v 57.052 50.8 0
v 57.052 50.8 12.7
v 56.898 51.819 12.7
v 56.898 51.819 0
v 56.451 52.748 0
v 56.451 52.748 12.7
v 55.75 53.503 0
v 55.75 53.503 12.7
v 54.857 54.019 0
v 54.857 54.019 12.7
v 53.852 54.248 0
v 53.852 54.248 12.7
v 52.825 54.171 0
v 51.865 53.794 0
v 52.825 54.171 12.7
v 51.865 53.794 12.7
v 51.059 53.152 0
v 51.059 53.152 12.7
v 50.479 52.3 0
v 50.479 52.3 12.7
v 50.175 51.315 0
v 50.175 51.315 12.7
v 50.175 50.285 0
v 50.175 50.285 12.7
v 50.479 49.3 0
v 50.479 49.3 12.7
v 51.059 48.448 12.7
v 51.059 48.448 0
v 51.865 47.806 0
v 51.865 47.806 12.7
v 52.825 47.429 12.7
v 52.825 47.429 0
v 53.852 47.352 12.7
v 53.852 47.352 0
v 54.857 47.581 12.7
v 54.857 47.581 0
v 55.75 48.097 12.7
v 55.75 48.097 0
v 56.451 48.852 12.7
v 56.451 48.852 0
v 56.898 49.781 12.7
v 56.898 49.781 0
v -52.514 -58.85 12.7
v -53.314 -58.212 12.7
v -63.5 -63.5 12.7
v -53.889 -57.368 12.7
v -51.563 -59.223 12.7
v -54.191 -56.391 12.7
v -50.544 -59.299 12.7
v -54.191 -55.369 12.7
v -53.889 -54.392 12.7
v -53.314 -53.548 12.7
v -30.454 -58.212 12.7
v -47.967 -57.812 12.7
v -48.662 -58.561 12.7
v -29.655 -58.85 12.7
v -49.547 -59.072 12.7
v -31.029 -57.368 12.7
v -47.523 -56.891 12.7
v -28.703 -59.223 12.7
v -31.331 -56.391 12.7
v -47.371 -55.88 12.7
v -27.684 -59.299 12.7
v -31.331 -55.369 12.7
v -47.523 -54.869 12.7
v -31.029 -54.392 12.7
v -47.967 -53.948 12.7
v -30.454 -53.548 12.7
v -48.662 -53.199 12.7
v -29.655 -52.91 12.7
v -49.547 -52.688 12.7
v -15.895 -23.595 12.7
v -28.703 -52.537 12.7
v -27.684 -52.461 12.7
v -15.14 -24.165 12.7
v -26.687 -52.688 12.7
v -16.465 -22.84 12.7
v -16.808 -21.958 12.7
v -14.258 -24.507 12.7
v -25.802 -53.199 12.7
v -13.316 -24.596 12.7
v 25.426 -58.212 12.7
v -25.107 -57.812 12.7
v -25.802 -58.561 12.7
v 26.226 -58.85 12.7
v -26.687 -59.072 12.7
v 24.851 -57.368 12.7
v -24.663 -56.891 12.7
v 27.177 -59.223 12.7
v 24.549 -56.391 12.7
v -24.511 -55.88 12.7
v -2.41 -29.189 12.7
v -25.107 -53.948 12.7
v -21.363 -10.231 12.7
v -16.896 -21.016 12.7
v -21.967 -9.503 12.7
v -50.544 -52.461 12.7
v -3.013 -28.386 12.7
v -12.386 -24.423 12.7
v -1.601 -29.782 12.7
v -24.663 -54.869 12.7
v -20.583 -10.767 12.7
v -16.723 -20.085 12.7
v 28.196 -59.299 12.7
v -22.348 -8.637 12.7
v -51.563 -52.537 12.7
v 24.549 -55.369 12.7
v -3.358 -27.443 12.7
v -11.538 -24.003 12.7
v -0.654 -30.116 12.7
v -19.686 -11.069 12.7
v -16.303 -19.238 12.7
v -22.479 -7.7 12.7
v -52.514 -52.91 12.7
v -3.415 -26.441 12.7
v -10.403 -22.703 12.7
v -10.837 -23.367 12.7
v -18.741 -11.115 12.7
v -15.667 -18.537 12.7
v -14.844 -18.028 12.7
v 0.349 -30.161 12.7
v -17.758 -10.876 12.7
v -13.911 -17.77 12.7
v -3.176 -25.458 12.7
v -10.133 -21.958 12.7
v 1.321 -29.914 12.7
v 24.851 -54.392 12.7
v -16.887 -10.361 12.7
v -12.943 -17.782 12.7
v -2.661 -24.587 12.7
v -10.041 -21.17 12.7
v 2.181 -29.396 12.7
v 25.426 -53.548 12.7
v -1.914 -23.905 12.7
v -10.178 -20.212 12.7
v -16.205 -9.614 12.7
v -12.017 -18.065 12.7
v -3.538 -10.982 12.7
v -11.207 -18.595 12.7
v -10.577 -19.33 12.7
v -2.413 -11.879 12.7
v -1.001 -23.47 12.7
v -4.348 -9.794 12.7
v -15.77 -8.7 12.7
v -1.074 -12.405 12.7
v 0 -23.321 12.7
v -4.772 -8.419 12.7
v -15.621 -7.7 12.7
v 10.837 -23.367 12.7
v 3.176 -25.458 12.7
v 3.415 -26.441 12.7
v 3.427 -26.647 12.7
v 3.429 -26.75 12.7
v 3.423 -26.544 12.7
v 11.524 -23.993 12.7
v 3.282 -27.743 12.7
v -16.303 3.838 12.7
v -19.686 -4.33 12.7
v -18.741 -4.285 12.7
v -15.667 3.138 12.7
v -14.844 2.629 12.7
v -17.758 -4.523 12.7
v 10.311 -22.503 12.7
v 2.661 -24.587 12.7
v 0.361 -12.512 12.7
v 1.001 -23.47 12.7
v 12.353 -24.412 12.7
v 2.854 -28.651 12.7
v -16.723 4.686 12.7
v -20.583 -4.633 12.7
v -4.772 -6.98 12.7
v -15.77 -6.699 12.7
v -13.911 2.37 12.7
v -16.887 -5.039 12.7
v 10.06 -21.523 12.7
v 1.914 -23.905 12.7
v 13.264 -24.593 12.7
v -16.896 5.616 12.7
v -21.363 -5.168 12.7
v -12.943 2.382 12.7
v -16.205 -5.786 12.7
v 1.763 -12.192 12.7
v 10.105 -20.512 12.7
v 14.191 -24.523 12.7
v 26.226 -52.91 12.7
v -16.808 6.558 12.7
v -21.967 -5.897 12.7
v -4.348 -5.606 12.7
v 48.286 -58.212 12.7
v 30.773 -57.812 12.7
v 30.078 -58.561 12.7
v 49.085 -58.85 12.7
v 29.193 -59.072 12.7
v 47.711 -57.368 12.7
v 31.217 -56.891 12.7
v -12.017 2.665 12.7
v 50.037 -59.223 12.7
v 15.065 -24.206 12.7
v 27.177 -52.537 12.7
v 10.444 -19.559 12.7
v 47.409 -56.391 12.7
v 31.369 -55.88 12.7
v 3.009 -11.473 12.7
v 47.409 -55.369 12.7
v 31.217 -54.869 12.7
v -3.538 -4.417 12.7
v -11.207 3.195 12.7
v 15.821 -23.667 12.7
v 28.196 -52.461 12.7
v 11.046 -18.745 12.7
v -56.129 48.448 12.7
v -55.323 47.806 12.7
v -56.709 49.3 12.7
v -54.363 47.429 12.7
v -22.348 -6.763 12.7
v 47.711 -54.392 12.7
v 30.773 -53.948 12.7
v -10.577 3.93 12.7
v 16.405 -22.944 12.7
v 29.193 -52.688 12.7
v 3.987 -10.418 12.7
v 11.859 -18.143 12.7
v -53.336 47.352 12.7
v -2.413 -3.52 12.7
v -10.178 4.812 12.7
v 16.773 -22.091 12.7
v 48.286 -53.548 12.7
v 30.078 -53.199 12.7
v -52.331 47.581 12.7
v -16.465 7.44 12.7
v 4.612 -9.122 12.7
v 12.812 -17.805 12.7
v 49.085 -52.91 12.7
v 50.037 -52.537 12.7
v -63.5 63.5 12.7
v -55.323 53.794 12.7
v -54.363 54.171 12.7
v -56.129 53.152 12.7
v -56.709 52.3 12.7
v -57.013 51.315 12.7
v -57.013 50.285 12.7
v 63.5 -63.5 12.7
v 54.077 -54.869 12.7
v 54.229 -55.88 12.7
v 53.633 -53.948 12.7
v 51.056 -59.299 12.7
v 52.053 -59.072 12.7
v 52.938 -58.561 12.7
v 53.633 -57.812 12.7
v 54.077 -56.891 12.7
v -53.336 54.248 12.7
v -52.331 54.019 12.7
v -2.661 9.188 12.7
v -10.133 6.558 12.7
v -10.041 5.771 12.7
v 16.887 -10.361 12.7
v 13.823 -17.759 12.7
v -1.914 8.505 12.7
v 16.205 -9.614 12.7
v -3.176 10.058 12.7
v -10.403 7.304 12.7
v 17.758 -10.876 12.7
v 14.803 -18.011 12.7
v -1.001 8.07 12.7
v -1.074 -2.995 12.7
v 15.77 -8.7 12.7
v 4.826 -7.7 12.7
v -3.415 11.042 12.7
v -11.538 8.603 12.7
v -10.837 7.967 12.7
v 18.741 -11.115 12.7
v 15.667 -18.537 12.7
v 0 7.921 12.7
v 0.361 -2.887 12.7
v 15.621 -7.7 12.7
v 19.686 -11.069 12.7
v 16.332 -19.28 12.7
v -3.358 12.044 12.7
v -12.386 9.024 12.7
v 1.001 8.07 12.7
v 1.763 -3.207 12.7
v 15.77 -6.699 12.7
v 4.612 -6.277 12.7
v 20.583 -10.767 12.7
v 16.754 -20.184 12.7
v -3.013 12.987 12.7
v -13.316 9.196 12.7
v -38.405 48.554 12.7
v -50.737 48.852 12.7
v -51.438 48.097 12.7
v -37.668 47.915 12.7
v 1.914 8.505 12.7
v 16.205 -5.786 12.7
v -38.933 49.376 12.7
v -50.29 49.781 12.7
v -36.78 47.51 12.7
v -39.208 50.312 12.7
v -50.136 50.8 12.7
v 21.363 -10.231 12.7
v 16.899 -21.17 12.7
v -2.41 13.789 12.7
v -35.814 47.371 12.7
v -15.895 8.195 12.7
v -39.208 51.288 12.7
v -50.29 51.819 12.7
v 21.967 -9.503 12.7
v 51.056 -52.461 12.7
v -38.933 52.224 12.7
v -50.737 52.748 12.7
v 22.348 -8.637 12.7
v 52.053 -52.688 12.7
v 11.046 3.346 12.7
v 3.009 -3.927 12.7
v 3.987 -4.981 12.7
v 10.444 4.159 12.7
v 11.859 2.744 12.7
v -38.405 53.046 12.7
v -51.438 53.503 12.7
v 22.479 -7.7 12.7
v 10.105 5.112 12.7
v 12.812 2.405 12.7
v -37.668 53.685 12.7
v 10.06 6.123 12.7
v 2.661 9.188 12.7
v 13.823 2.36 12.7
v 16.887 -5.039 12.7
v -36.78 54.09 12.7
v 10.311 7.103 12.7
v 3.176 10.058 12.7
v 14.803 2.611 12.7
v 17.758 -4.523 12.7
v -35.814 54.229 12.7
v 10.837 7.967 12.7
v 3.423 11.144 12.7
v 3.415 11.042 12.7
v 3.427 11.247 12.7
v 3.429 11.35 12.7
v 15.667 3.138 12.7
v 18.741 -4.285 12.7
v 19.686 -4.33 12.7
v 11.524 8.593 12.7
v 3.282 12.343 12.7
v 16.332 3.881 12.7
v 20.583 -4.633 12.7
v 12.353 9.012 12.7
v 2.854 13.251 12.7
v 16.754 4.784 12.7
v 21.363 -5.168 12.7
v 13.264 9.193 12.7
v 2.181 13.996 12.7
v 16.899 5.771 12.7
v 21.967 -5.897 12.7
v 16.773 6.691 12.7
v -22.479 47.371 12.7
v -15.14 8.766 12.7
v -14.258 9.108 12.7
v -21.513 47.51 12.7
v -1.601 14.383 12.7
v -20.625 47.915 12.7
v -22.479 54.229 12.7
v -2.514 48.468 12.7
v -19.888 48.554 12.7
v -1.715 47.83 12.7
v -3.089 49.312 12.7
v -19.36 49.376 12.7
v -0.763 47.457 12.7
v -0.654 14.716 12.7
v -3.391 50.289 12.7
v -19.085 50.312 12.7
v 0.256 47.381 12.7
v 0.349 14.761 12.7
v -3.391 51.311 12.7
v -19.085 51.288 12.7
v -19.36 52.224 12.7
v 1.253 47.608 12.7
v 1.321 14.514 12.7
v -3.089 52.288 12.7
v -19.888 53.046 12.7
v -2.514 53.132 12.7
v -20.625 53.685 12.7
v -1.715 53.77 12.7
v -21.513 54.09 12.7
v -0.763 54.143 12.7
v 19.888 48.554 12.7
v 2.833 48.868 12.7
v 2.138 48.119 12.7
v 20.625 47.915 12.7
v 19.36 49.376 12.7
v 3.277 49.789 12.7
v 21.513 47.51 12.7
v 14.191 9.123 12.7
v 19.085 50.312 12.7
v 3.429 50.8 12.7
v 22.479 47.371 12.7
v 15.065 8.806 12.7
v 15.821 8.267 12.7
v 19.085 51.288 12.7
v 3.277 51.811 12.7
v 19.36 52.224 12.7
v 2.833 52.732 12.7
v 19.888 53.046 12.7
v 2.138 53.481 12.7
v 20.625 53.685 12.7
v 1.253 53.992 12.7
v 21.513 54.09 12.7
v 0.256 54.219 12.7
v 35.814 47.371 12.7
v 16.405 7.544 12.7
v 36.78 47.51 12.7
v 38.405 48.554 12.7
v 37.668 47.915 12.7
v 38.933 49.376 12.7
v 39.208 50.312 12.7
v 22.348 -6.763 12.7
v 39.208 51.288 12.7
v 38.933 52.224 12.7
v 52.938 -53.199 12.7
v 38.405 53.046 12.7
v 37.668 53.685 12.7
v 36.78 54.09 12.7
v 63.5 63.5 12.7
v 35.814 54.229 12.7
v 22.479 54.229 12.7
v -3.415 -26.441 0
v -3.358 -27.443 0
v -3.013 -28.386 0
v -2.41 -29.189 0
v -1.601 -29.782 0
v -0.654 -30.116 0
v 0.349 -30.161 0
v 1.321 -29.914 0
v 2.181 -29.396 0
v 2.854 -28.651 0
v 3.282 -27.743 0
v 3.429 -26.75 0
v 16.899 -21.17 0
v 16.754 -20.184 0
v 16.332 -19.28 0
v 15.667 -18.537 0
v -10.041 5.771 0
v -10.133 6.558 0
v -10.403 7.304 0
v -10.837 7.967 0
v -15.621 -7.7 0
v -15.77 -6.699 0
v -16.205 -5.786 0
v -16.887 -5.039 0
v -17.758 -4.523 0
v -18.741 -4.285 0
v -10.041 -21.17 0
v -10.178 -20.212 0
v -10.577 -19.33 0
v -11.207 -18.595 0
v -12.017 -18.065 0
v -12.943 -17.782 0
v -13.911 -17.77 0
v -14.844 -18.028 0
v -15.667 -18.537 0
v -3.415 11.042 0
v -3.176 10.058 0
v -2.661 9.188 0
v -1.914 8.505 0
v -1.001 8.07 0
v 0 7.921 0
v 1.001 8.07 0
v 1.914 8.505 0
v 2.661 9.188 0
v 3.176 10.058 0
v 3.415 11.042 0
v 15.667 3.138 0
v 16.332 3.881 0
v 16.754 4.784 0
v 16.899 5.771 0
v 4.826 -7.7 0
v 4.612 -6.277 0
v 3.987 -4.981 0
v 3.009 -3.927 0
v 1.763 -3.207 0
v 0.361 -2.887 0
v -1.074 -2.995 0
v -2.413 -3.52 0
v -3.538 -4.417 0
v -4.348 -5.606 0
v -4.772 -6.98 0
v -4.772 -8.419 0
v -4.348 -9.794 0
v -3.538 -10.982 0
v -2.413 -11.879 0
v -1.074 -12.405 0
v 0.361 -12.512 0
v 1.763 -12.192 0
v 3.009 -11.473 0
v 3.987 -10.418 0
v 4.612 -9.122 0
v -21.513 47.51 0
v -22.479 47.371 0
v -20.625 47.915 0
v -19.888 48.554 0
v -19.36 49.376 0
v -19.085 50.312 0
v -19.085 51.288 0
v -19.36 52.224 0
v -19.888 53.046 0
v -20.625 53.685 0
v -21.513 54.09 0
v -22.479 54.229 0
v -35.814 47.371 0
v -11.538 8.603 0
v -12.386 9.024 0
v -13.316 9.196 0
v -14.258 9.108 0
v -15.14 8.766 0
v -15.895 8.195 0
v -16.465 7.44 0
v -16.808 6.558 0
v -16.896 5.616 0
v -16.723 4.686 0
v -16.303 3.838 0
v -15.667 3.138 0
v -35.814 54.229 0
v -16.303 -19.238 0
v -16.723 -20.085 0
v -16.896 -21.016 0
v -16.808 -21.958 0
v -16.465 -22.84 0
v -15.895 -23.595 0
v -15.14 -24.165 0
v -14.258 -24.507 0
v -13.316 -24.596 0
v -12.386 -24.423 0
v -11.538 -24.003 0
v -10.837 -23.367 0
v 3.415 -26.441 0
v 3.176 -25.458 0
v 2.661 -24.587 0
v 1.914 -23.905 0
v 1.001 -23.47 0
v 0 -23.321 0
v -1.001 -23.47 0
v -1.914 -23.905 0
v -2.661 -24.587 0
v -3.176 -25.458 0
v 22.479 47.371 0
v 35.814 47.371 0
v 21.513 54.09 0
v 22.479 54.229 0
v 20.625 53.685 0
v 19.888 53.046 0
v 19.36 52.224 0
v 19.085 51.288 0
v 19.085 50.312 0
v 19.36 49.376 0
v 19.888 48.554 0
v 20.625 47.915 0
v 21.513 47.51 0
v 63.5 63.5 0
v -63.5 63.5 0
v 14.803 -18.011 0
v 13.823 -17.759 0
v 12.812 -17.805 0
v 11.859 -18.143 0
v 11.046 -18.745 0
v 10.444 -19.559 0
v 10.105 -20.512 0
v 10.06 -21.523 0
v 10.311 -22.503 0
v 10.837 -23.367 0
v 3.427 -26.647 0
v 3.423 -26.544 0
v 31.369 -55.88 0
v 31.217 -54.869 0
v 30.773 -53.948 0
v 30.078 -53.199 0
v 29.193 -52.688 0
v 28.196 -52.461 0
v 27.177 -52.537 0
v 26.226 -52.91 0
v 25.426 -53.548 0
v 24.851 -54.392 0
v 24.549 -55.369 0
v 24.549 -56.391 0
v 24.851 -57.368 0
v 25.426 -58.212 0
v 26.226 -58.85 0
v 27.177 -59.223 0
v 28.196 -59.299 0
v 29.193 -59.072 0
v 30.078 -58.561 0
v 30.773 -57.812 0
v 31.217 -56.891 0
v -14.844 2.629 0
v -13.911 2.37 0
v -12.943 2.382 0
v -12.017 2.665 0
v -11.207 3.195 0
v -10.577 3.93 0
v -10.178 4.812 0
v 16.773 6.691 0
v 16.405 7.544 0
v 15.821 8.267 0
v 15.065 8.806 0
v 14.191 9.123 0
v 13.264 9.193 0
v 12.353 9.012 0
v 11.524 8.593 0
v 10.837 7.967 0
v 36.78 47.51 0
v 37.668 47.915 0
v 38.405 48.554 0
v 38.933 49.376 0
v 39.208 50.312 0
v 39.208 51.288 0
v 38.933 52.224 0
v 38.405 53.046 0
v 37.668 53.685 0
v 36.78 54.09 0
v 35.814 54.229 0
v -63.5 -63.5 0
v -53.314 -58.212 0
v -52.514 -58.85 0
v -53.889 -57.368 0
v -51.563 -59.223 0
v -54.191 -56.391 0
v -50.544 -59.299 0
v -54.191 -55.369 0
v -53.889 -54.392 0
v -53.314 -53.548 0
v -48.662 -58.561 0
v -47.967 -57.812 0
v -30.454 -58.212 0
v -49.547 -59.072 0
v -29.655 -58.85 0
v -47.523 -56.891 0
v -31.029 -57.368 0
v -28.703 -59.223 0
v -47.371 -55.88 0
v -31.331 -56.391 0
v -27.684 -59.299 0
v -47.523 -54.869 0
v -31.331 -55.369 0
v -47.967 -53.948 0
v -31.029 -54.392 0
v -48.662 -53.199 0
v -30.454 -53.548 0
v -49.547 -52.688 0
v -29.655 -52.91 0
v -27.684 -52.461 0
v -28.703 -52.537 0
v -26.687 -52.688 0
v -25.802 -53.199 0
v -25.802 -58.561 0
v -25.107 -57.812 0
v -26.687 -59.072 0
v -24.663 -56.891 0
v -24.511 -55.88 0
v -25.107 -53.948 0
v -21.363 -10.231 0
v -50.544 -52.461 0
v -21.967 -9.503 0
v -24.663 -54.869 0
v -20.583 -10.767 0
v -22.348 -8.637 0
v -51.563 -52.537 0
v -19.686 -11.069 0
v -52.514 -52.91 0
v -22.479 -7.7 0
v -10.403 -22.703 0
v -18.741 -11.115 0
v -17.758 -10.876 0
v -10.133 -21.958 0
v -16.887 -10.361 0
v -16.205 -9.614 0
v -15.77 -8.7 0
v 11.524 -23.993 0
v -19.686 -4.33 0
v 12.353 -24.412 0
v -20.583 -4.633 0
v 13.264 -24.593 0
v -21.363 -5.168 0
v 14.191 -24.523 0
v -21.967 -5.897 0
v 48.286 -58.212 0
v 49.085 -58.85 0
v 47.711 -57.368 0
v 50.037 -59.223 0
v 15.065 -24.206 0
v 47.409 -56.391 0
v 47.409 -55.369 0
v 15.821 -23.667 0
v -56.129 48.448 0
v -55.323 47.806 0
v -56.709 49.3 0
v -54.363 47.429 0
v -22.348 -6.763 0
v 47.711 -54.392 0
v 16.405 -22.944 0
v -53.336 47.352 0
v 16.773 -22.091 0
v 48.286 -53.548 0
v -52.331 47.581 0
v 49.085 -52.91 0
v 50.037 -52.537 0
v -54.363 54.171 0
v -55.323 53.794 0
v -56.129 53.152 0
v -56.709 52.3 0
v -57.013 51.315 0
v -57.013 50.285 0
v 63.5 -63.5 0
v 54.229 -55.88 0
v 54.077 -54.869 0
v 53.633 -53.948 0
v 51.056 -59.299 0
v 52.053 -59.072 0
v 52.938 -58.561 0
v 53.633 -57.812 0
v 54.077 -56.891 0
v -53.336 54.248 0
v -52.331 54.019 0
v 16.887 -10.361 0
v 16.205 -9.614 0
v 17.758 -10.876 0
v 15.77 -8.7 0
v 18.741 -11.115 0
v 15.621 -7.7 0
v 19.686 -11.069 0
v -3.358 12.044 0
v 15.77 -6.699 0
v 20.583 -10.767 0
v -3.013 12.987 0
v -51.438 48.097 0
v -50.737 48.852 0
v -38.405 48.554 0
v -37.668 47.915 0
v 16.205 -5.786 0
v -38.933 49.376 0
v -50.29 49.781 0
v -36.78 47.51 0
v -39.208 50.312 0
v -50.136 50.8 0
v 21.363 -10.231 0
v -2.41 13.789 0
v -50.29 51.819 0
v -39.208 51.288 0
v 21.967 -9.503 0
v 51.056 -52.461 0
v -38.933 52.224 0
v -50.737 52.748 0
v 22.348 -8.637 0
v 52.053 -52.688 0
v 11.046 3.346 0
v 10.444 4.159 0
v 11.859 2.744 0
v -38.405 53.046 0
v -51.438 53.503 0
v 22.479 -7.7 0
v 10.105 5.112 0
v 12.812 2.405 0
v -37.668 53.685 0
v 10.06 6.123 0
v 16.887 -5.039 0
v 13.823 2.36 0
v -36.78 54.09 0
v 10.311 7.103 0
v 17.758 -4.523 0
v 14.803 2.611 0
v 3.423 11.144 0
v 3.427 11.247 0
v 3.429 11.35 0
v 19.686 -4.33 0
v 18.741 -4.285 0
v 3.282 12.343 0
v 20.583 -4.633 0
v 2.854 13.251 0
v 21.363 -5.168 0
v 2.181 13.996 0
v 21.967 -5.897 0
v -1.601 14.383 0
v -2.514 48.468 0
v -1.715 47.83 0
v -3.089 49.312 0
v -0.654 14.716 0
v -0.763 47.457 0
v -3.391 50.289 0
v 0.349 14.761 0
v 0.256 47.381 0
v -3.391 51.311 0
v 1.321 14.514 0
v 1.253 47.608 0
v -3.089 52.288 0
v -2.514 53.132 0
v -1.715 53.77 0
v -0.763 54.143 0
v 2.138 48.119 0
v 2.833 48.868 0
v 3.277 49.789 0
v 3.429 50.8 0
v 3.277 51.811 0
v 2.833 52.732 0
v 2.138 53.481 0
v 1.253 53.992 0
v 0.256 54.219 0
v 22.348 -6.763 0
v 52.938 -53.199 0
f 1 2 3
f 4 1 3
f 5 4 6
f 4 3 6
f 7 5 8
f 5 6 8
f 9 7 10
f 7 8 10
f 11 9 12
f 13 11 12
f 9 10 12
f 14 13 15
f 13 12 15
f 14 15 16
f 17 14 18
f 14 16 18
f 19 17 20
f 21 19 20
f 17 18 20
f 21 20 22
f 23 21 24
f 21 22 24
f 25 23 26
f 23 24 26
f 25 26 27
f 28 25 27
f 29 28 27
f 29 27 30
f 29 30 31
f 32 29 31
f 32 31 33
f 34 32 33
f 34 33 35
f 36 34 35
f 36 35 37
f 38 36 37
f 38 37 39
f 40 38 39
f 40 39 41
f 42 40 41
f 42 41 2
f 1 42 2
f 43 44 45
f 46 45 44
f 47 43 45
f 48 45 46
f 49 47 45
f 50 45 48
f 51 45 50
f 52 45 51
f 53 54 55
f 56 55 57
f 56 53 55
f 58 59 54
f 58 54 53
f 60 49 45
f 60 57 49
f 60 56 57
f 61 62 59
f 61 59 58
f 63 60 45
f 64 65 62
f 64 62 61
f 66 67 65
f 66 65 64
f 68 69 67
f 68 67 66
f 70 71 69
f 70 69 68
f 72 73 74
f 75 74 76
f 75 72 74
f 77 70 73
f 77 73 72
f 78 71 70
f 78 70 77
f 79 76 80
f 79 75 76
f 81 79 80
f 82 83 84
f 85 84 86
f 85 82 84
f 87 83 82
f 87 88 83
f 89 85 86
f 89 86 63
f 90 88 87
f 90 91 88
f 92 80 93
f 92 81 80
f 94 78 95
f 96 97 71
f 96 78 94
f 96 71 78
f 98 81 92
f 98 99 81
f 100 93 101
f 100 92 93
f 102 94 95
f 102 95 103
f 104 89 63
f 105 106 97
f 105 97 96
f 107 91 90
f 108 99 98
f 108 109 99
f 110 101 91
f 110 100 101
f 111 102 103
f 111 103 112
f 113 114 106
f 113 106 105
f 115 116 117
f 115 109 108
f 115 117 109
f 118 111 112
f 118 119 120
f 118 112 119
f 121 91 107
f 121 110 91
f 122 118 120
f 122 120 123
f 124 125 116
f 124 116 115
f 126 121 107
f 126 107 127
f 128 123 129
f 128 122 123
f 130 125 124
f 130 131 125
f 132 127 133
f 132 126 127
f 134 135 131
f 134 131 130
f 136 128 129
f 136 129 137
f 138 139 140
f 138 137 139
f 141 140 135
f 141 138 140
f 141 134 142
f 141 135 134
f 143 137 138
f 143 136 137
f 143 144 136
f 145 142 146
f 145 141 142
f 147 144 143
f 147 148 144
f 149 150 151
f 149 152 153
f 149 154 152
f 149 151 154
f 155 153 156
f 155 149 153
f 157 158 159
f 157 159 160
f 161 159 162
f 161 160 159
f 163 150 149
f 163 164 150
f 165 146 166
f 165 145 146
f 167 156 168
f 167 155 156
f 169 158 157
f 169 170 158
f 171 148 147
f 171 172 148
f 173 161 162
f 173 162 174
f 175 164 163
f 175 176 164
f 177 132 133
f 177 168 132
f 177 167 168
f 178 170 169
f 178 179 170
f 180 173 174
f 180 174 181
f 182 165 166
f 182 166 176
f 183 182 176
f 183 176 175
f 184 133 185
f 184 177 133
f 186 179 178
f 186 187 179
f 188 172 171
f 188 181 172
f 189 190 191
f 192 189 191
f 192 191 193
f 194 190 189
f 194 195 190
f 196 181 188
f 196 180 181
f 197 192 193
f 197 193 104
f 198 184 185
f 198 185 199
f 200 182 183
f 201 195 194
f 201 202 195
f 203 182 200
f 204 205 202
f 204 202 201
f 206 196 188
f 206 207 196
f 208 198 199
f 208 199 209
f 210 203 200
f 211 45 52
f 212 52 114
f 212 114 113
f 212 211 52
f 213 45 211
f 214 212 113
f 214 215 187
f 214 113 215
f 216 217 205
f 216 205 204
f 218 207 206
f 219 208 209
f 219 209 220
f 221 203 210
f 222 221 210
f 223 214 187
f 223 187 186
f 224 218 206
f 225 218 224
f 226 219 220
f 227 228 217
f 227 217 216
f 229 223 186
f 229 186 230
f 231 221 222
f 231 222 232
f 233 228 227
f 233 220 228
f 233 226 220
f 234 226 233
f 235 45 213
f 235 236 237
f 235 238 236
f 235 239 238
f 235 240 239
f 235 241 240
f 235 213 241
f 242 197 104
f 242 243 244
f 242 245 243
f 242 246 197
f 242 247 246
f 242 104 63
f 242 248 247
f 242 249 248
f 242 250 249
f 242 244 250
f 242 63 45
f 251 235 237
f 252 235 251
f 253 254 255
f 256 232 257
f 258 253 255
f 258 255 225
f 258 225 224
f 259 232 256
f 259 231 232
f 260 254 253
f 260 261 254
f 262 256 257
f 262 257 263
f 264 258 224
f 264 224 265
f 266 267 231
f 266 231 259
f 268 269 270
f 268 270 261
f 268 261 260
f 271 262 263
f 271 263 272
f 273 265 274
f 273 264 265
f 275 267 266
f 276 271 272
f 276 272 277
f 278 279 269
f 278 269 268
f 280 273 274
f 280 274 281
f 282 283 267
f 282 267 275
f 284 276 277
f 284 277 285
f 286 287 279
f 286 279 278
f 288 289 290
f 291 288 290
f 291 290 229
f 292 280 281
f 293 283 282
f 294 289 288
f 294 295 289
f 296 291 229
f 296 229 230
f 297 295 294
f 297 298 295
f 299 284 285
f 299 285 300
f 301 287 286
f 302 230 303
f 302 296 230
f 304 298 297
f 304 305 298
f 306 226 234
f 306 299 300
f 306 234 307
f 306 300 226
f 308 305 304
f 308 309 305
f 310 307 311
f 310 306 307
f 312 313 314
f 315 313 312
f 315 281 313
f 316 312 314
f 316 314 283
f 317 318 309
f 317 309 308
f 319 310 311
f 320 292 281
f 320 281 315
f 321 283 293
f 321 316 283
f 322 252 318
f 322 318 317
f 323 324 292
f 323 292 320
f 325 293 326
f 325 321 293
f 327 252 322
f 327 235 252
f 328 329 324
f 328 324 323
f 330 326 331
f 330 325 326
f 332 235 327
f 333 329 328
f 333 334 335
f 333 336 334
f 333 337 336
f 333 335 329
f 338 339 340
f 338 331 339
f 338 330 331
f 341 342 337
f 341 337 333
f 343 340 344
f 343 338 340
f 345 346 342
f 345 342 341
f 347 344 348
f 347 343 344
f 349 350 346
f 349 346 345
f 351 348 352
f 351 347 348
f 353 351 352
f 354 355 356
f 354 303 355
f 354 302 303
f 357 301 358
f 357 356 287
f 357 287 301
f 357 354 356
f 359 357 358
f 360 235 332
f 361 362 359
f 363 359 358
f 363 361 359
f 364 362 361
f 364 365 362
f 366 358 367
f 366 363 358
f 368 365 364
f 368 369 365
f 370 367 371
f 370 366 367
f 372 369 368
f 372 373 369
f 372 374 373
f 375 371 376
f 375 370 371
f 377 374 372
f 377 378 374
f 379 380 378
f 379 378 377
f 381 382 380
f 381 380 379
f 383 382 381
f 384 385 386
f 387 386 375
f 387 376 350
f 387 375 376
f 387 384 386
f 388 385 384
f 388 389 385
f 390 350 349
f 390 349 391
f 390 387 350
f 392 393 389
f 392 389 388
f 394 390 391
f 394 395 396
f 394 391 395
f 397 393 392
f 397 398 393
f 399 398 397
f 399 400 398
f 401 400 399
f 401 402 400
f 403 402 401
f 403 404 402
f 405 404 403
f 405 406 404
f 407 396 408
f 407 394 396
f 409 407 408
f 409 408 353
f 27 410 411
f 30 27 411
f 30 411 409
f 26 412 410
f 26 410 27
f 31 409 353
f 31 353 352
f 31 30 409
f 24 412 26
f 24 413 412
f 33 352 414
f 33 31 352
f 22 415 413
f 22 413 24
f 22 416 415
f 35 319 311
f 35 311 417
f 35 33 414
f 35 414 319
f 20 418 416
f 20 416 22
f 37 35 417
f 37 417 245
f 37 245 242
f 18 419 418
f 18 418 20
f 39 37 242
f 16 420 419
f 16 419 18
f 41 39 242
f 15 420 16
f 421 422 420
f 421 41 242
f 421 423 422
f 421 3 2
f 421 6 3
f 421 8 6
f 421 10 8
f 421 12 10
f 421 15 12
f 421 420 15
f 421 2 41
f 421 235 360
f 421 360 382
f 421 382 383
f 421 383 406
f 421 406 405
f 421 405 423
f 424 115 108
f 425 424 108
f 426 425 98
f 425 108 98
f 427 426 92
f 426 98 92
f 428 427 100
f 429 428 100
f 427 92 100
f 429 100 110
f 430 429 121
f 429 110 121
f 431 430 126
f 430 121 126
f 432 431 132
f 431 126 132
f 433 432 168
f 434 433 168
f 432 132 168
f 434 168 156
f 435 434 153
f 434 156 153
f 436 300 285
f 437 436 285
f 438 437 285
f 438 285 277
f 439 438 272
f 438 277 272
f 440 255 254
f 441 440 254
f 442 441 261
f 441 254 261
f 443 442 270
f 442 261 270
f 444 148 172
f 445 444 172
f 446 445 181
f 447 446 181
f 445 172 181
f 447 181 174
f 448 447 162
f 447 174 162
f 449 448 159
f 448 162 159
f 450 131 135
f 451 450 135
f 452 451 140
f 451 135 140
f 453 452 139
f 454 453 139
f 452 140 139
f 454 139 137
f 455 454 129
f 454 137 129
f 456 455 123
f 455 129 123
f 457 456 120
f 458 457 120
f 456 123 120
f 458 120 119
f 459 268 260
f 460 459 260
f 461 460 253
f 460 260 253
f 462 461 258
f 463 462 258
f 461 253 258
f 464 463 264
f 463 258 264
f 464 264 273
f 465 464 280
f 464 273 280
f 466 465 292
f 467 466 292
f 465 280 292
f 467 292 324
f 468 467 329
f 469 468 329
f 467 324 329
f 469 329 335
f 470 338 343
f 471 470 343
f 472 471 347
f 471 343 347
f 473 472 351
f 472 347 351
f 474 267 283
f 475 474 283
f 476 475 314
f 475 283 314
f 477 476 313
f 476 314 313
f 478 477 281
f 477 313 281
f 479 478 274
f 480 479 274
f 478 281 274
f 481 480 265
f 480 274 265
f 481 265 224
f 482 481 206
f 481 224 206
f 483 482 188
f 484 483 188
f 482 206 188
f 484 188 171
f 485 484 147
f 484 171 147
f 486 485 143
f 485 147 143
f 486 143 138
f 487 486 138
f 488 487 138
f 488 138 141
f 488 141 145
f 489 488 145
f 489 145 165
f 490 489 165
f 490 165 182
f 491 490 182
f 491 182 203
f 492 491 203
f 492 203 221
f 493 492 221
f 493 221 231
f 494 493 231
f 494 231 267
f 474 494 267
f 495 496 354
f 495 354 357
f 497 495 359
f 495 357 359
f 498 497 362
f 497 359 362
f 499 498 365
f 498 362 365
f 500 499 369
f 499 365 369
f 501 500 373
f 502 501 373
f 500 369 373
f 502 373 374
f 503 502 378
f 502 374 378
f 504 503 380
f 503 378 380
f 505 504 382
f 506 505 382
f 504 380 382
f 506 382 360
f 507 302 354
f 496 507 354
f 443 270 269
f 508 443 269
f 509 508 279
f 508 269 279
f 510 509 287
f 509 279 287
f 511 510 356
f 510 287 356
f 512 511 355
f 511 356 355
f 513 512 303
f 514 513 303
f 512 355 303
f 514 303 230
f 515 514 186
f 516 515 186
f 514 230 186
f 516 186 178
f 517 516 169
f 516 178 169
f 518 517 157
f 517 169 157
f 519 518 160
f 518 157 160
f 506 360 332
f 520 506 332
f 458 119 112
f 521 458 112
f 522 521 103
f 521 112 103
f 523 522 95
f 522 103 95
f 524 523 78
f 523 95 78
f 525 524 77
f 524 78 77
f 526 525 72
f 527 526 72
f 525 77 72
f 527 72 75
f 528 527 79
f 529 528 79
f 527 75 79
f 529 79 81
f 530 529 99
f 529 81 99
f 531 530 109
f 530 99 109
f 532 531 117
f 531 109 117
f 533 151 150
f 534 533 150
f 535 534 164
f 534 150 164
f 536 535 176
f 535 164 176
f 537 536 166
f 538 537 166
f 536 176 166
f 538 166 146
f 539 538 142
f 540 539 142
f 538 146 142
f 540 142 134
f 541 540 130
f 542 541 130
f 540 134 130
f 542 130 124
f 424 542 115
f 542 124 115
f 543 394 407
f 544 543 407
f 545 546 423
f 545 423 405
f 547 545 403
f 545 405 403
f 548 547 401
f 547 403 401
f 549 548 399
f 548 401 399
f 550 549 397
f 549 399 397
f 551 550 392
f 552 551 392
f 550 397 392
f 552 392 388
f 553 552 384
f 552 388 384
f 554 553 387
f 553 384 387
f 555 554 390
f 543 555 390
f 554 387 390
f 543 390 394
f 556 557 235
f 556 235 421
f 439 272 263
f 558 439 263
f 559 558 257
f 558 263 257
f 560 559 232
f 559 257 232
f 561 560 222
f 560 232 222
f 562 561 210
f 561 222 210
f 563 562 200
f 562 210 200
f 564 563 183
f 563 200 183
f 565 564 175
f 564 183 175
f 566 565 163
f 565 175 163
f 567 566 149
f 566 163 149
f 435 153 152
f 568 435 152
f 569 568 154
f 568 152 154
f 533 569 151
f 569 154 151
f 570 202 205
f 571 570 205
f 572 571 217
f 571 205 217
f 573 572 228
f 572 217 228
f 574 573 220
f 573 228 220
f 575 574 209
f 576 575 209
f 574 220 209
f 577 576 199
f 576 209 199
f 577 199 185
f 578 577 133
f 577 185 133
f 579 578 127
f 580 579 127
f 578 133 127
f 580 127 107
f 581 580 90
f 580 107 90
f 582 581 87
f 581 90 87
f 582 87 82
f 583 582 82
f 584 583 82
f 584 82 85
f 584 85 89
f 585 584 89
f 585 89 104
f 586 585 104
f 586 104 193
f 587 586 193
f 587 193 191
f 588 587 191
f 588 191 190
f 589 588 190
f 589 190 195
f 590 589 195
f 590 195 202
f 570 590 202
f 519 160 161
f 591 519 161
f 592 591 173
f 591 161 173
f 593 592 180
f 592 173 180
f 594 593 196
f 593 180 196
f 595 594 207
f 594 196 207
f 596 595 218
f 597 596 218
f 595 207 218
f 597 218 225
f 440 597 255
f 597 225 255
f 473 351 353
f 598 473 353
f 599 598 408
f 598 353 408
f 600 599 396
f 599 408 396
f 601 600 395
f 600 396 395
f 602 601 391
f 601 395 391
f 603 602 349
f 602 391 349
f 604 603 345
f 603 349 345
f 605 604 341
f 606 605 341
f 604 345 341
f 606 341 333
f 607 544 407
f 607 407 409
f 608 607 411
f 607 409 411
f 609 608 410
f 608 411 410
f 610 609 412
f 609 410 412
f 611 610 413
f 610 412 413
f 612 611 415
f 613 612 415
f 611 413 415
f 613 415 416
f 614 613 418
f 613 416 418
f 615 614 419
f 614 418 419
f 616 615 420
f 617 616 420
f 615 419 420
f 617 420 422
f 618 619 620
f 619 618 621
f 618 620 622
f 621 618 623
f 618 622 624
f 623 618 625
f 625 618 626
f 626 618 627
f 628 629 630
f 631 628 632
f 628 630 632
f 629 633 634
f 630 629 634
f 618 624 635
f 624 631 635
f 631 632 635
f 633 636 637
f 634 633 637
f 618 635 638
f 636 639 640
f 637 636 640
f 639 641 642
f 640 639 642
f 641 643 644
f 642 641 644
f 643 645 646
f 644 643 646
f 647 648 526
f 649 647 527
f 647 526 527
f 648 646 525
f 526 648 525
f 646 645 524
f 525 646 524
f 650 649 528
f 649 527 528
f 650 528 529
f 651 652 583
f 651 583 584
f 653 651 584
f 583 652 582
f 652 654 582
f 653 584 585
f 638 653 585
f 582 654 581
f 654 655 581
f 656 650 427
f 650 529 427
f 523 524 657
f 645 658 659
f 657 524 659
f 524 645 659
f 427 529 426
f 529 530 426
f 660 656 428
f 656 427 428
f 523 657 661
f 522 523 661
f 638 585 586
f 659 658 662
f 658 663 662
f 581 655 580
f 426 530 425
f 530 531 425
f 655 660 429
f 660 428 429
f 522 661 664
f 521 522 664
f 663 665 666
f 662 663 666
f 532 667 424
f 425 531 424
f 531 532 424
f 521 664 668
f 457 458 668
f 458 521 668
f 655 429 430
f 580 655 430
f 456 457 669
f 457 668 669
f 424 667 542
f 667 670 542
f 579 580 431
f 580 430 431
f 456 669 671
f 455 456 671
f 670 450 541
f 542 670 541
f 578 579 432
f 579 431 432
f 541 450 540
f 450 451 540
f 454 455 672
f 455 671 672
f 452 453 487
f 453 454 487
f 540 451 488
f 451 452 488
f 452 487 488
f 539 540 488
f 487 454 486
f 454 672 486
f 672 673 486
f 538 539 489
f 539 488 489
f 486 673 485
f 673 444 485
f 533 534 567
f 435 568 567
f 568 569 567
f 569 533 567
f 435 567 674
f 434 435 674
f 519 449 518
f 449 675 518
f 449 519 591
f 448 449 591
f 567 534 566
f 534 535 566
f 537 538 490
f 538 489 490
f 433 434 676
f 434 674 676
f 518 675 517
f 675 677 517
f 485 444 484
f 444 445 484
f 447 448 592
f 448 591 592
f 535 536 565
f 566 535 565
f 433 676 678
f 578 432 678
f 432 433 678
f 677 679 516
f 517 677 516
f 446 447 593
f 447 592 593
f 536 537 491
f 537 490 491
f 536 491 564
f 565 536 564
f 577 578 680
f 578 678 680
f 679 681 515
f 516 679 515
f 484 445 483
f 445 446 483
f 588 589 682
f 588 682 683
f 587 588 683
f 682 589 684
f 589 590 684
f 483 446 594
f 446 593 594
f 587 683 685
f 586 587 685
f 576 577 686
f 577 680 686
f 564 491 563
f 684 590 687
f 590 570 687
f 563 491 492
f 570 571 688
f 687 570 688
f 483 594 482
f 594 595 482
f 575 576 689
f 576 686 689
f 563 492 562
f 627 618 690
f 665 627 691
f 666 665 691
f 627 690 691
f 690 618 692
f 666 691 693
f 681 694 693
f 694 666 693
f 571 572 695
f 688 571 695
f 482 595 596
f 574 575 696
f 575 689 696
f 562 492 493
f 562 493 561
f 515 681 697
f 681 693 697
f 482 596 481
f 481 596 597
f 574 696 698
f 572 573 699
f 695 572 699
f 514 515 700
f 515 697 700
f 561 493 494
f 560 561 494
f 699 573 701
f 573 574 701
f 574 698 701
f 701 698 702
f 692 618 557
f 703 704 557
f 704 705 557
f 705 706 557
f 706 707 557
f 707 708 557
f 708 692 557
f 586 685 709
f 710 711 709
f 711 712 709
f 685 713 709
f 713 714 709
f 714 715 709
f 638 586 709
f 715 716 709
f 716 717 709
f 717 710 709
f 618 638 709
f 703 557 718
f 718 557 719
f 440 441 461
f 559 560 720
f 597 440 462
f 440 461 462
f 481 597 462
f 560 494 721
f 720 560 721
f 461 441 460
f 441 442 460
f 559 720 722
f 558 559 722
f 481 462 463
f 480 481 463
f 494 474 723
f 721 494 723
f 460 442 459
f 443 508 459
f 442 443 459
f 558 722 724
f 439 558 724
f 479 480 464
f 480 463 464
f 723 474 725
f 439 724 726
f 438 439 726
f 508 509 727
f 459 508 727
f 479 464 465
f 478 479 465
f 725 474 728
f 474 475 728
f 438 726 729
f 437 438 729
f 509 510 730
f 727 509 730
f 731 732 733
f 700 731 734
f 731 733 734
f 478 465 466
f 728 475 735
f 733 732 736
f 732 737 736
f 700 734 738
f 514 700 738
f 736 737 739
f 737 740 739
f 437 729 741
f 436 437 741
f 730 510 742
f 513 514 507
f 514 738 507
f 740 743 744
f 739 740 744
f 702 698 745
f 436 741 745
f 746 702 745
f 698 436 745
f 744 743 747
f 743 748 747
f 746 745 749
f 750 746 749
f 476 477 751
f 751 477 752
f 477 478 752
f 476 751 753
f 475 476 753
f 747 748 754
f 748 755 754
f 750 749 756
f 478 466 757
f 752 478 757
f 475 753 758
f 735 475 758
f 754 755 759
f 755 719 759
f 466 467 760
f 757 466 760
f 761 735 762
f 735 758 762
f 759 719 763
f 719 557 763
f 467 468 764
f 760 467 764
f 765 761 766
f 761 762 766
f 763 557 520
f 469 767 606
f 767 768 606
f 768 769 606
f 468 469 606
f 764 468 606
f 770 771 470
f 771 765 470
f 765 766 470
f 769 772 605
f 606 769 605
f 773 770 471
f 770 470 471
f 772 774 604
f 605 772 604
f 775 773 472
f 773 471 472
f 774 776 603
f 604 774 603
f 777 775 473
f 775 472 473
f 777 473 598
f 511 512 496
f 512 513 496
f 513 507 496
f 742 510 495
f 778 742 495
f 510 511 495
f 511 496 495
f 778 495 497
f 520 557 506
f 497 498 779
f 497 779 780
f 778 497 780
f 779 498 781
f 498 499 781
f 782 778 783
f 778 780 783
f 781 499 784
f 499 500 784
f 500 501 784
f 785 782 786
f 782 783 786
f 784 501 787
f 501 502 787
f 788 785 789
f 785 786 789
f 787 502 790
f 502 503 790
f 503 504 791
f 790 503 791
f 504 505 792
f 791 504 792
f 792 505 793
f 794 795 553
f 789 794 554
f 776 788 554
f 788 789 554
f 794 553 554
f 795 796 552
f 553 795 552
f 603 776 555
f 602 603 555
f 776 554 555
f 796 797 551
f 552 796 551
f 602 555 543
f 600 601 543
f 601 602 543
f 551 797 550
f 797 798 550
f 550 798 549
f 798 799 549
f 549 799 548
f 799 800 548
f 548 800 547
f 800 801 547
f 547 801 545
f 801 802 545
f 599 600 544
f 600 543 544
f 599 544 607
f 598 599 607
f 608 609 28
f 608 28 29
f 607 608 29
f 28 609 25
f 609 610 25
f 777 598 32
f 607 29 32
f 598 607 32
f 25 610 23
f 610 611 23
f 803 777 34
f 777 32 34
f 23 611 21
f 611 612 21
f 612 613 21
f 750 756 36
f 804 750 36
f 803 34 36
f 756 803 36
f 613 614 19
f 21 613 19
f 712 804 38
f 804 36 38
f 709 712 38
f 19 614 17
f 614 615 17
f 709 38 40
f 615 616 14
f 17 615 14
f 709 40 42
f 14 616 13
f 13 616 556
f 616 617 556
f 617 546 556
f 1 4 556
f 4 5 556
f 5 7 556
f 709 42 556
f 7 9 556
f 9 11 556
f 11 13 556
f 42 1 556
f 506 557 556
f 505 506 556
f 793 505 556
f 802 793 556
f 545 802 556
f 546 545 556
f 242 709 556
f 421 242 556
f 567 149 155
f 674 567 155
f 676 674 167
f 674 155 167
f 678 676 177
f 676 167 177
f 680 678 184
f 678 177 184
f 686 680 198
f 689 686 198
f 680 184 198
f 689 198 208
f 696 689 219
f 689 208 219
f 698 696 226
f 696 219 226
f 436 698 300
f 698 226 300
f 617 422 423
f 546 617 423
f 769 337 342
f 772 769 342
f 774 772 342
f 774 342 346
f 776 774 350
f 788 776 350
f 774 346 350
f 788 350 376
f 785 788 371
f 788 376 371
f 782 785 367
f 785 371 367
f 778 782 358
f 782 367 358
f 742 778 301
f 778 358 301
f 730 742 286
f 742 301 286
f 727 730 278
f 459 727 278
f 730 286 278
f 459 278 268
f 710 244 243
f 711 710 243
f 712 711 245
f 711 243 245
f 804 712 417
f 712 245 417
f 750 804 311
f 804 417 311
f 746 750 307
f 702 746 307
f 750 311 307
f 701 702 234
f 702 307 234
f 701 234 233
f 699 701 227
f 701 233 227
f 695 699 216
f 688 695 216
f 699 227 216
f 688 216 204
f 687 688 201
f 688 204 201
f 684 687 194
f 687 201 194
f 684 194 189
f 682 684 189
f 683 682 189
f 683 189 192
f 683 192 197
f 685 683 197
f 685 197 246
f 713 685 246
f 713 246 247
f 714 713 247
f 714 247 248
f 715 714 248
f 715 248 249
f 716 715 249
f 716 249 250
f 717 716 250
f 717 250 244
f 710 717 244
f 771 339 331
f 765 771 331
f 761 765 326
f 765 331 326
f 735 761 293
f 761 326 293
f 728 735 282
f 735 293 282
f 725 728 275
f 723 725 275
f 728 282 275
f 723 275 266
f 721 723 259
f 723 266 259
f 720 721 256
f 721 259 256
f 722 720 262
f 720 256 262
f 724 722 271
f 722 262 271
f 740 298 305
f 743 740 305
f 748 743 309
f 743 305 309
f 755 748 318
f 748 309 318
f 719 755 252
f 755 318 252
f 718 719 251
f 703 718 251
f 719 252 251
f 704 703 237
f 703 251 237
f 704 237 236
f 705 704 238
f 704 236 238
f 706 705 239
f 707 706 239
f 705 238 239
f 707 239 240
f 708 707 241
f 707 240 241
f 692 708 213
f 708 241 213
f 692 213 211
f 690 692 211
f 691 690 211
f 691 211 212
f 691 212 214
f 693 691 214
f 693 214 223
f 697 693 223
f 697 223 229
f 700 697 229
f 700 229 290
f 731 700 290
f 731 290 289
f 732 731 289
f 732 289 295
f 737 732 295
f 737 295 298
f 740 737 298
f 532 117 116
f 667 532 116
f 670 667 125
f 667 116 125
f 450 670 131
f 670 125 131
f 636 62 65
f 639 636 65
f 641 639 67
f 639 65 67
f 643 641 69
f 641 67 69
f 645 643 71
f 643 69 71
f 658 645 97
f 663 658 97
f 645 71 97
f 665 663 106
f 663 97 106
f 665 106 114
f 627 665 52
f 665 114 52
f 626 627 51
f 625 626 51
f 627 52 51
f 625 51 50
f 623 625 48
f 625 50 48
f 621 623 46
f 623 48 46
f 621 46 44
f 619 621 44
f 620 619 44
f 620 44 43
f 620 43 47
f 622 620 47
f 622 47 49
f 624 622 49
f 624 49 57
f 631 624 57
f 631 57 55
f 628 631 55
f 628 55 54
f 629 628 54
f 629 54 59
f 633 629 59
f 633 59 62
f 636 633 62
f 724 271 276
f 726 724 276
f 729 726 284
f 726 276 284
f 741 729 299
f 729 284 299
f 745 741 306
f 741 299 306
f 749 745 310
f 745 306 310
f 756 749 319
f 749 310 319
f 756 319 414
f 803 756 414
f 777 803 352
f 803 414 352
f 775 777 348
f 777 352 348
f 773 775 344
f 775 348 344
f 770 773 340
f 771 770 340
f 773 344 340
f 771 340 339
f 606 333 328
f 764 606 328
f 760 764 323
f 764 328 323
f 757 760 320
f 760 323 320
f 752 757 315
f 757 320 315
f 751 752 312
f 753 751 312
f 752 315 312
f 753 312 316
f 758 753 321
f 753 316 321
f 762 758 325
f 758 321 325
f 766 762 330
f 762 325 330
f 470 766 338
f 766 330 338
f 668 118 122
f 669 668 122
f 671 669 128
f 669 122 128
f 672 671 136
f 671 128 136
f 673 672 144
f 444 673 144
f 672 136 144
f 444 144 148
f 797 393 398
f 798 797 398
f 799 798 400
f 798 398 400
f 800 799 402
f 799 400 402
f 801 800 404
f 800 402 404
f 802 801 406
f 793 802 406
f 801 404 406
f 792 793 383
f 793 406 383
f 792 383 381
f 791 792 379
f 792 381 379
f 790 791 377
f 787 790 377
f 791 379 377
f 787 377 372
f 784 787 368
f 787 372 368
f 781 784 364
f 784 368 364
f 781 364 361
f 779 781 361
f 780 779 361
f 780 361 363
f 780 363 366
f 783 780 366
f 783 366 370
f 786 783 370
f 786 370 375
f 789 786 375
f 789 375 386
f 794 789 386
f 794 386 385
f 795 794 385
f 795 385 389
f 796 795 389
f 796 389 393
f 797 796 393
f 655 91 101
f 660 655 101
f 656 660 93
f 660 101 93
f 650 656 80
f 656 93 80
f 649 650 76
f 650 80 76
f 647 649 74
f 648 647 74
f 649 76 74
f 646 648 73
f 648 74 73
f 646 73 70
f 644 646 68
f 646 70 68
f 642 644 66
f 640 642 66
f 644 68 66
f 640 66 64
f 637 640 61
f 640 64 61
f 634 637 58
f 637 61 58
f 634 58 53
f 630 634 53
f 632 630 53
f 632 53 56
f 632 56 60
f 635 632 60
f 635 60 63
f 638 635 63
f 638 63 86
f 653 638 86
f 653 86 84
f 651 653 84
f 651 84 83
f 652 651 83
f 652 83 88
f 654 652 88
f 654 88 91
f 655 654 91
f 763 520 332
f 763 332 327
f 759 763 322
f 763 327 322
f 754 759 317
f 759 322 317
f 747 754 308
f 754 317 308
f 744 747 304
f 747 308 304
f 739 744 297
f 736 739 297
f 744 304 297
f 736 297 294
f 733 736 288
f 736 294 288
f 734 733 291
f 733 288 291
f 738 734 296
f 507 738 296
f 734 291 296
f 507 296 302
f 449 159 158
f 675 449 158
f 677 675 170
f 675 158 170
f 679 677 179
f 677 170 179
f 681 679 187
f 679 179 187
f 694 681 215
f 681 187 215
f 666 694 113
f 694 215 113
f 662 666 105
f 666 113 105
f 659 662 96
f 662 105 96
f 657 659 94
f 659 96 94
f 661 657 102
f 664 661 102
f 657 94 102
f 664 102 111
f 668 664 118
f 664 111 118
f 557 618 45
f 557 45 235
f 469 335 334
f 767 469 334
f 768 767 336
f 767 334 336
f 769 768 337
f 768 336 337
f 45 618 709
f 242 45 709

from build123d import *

# Parameters (mm, degrees)
F0_W     = 127
F0_H     = 127
F1_DEPTH = 12.7
F2_R     = 4.826
F3_DEPTH = 25.4
F4_R     = 3.429
F4_R_2   = 3.4577066483
F5_DEPTH = 25.4


# Not quite as in the source:
# - a feature names something its author has since deleted; it is built from what else it names


with BuildPart() as f1:
    # F0 (on Top) → F1 (new body)
    with BuildSketch(Plane.XY):
        Rectangle(F0_W, F0_H)
    extrude(amount=F1_DEPTH)

    # F2 (on face) → F3 (cut)
    with BuildSketch(Plane.XY.offset(12.7)):
        with BuildLine():
            ThreePointArc((-10.8373346815, 7.9672162229), (-15.8950533343, 8.195276323), (-15.6669932342, 3.1375576702))
            ThreePointArc((-15.6669932342, 3.1375576702), (-12.0167906073, 2.664949958), (-10.0413841816, 5.7706071703))
            ThreePointArc((-10.0413841816, 5.7706071703), (-10.2465070332, 6.9387925717), (-10.8373346815, 7.9672162229))
        make_face()
        with BuildLine():
            ThreePointArc((3.429, 11.3502229887), (-0.1544617901, 14.7757423005), (-3.4150843134, 11.0416129887))
            ThreePointArc((-3.4150843134, 11.0416129887), (0, 7.9212229887), (3.4150843134, 11.0416129887))
            ThreePointArc((3.4150843134, 11.0416129887), (3.4255193118, 11.1957611986), (3.429, 11.3502229887))
        make_face()
        with BuildLine():
            ThreePointArc((16.8993841816, 5.7706071703), (14.638569583, 8.9944843187), (10.8373346815, 7.9672162229))
            ThreePointArc((10.8373346815, 7.9672162229), (11.0457150289, 3.3459380176), (15.6669932342, 3.1375576702))
            ThreePointArc((15.6669932342, 3.1375576702), (16.576041394, 4.317013596), (16.8993841816, 5.7706071703))
        make_face()
        with BuildLine():
            ThreePointArc((22.479, -7.6997770113), (21.3629869552, -5.1683480976), (18.74139, -4.2846926978))
            ThreePointArc((18.74139, -4.2846926978), (15.621, -7.6997770113), (18.74139, -11.1148613247))
            ThreePointArc((18.74139, -11.1148613247), (21.3629869552, -10.231205925), (22.479, -7.6997770113))
        make_face()
        with BuildLine():
            ThreePointArc((15.6669932342, -18.5371116928), (11.0457150289, -18.7454920402), (10.8373346815, -23.3667702455))
            ThreePointArc((10.8373346815, -23.3667702455), (14.638569583, -24.3940383413), (16.8993841816, -21.1701611929))
            ThreePointArc((16.8993841816, -21.1701611929), (16.576041394, -19.7165676186), (15.6669932342, -18.5371116928))
        make_face()
        with BuildLine():
            ThreePointArc((3.4150843134, -26.4411670113), (0, -23.3207770113), (-3.4150843134, -26.4411670113))
            ThreePointArc((-3.4150843134, -26.4411670113), (-0.1544617901, -30.1752963231), (3.429, -26.7497770113))
            ThreePointArc((3.429, -26.7497770113), (3.4255193118, -26.5953152212), (3.4150843134, -26.4411670113))
        make_face()
        with BuildLine():
            ThreePointArc((-10.0413841816, -21.1701611929), (-12.0167906073, -18.0645039805), (-15.6669932342, -18.5371116928))
            ThreePointArc((-15.6669932342, -18.5371116928), (-15.8950533343, -23.5948303456), (-10.8373346815, -23.3667702455))
            ThreePointArc((-10.8373346815, -23.3667702455), (-10.2465070332, -22.3383465943), (-10.0413841816, -21.1701611929))
        make_face()
        with BuildLine():
            ThreePointArc((-15.621, -7.6997770113), (-16.5185710863, -5.3867900561), (-18.74139, -4.2846926978))
            ThreePointArc((-18.74139, -4.2846926978), (-22.479, -7.6997770113), (-18.74139, -11.1148613247))
            ThreePointArc((-18.74139, -11.1148613247), (-16.5185710863, -10.0127639665), (-15.621, -7.6997770113))
        make_face()
        with Locations((0, -7.6997770113)):
            Circle(F2_R)
    extrude(amount=-F3_DEPTH, mode=Mode.SUBTRACT)

    # F4 (on face) → F5 (cut)
    with BuildSketch(Plane.XY.offset(12.7)):
        with Locations((0, 50.8)):
            Circle(F4_R)
        with Locations((27.94, -55.88)):
            Circle(F4_R)
        with Locations((50.8, -55.88)):
            Circle(F4_R)
        with Locations((-50.8, -55.88)):
            Circle(F4_R)
        with Locations((-27.94, -55.88)):
            Circle(F4_R)
        with Locations((-53.594, 50.8)):
            Circle(F4_R_2)
        with Locations((53.594, 50.8)):
            Circle(F4_R_2)
        with BuildLine():
            Line((-22.479, 54.229), (-35.814, 54.229))
            ThreePointArc((-35.814, 54.229), (-39.243, 50.8), (-35.814, 47.371))
            Line((-35.814, 47.371), (-22.479, 47.371))
            ThreePointArc((-22.479, 47.371), (-19.05, 50.8), (-22.479, 54.229))
        make_face()
        with BuildLine():
            ThreePointArc((35.814, 47.371), (39.243, 50.8), (35.814, 54.229))
            Line((35.814, 54.229), (22.479, 54.229))
            ThreePointArc((22.479, 54.229), (19.05, 50.8), (22.479, 47.371))
            Line((22.479, 47.371), (35.814, 47.371))
        make_face()
    extrude(amount=-F5_DEPTH, mode=Mode.SUBTRACT)


solid = f1.part
